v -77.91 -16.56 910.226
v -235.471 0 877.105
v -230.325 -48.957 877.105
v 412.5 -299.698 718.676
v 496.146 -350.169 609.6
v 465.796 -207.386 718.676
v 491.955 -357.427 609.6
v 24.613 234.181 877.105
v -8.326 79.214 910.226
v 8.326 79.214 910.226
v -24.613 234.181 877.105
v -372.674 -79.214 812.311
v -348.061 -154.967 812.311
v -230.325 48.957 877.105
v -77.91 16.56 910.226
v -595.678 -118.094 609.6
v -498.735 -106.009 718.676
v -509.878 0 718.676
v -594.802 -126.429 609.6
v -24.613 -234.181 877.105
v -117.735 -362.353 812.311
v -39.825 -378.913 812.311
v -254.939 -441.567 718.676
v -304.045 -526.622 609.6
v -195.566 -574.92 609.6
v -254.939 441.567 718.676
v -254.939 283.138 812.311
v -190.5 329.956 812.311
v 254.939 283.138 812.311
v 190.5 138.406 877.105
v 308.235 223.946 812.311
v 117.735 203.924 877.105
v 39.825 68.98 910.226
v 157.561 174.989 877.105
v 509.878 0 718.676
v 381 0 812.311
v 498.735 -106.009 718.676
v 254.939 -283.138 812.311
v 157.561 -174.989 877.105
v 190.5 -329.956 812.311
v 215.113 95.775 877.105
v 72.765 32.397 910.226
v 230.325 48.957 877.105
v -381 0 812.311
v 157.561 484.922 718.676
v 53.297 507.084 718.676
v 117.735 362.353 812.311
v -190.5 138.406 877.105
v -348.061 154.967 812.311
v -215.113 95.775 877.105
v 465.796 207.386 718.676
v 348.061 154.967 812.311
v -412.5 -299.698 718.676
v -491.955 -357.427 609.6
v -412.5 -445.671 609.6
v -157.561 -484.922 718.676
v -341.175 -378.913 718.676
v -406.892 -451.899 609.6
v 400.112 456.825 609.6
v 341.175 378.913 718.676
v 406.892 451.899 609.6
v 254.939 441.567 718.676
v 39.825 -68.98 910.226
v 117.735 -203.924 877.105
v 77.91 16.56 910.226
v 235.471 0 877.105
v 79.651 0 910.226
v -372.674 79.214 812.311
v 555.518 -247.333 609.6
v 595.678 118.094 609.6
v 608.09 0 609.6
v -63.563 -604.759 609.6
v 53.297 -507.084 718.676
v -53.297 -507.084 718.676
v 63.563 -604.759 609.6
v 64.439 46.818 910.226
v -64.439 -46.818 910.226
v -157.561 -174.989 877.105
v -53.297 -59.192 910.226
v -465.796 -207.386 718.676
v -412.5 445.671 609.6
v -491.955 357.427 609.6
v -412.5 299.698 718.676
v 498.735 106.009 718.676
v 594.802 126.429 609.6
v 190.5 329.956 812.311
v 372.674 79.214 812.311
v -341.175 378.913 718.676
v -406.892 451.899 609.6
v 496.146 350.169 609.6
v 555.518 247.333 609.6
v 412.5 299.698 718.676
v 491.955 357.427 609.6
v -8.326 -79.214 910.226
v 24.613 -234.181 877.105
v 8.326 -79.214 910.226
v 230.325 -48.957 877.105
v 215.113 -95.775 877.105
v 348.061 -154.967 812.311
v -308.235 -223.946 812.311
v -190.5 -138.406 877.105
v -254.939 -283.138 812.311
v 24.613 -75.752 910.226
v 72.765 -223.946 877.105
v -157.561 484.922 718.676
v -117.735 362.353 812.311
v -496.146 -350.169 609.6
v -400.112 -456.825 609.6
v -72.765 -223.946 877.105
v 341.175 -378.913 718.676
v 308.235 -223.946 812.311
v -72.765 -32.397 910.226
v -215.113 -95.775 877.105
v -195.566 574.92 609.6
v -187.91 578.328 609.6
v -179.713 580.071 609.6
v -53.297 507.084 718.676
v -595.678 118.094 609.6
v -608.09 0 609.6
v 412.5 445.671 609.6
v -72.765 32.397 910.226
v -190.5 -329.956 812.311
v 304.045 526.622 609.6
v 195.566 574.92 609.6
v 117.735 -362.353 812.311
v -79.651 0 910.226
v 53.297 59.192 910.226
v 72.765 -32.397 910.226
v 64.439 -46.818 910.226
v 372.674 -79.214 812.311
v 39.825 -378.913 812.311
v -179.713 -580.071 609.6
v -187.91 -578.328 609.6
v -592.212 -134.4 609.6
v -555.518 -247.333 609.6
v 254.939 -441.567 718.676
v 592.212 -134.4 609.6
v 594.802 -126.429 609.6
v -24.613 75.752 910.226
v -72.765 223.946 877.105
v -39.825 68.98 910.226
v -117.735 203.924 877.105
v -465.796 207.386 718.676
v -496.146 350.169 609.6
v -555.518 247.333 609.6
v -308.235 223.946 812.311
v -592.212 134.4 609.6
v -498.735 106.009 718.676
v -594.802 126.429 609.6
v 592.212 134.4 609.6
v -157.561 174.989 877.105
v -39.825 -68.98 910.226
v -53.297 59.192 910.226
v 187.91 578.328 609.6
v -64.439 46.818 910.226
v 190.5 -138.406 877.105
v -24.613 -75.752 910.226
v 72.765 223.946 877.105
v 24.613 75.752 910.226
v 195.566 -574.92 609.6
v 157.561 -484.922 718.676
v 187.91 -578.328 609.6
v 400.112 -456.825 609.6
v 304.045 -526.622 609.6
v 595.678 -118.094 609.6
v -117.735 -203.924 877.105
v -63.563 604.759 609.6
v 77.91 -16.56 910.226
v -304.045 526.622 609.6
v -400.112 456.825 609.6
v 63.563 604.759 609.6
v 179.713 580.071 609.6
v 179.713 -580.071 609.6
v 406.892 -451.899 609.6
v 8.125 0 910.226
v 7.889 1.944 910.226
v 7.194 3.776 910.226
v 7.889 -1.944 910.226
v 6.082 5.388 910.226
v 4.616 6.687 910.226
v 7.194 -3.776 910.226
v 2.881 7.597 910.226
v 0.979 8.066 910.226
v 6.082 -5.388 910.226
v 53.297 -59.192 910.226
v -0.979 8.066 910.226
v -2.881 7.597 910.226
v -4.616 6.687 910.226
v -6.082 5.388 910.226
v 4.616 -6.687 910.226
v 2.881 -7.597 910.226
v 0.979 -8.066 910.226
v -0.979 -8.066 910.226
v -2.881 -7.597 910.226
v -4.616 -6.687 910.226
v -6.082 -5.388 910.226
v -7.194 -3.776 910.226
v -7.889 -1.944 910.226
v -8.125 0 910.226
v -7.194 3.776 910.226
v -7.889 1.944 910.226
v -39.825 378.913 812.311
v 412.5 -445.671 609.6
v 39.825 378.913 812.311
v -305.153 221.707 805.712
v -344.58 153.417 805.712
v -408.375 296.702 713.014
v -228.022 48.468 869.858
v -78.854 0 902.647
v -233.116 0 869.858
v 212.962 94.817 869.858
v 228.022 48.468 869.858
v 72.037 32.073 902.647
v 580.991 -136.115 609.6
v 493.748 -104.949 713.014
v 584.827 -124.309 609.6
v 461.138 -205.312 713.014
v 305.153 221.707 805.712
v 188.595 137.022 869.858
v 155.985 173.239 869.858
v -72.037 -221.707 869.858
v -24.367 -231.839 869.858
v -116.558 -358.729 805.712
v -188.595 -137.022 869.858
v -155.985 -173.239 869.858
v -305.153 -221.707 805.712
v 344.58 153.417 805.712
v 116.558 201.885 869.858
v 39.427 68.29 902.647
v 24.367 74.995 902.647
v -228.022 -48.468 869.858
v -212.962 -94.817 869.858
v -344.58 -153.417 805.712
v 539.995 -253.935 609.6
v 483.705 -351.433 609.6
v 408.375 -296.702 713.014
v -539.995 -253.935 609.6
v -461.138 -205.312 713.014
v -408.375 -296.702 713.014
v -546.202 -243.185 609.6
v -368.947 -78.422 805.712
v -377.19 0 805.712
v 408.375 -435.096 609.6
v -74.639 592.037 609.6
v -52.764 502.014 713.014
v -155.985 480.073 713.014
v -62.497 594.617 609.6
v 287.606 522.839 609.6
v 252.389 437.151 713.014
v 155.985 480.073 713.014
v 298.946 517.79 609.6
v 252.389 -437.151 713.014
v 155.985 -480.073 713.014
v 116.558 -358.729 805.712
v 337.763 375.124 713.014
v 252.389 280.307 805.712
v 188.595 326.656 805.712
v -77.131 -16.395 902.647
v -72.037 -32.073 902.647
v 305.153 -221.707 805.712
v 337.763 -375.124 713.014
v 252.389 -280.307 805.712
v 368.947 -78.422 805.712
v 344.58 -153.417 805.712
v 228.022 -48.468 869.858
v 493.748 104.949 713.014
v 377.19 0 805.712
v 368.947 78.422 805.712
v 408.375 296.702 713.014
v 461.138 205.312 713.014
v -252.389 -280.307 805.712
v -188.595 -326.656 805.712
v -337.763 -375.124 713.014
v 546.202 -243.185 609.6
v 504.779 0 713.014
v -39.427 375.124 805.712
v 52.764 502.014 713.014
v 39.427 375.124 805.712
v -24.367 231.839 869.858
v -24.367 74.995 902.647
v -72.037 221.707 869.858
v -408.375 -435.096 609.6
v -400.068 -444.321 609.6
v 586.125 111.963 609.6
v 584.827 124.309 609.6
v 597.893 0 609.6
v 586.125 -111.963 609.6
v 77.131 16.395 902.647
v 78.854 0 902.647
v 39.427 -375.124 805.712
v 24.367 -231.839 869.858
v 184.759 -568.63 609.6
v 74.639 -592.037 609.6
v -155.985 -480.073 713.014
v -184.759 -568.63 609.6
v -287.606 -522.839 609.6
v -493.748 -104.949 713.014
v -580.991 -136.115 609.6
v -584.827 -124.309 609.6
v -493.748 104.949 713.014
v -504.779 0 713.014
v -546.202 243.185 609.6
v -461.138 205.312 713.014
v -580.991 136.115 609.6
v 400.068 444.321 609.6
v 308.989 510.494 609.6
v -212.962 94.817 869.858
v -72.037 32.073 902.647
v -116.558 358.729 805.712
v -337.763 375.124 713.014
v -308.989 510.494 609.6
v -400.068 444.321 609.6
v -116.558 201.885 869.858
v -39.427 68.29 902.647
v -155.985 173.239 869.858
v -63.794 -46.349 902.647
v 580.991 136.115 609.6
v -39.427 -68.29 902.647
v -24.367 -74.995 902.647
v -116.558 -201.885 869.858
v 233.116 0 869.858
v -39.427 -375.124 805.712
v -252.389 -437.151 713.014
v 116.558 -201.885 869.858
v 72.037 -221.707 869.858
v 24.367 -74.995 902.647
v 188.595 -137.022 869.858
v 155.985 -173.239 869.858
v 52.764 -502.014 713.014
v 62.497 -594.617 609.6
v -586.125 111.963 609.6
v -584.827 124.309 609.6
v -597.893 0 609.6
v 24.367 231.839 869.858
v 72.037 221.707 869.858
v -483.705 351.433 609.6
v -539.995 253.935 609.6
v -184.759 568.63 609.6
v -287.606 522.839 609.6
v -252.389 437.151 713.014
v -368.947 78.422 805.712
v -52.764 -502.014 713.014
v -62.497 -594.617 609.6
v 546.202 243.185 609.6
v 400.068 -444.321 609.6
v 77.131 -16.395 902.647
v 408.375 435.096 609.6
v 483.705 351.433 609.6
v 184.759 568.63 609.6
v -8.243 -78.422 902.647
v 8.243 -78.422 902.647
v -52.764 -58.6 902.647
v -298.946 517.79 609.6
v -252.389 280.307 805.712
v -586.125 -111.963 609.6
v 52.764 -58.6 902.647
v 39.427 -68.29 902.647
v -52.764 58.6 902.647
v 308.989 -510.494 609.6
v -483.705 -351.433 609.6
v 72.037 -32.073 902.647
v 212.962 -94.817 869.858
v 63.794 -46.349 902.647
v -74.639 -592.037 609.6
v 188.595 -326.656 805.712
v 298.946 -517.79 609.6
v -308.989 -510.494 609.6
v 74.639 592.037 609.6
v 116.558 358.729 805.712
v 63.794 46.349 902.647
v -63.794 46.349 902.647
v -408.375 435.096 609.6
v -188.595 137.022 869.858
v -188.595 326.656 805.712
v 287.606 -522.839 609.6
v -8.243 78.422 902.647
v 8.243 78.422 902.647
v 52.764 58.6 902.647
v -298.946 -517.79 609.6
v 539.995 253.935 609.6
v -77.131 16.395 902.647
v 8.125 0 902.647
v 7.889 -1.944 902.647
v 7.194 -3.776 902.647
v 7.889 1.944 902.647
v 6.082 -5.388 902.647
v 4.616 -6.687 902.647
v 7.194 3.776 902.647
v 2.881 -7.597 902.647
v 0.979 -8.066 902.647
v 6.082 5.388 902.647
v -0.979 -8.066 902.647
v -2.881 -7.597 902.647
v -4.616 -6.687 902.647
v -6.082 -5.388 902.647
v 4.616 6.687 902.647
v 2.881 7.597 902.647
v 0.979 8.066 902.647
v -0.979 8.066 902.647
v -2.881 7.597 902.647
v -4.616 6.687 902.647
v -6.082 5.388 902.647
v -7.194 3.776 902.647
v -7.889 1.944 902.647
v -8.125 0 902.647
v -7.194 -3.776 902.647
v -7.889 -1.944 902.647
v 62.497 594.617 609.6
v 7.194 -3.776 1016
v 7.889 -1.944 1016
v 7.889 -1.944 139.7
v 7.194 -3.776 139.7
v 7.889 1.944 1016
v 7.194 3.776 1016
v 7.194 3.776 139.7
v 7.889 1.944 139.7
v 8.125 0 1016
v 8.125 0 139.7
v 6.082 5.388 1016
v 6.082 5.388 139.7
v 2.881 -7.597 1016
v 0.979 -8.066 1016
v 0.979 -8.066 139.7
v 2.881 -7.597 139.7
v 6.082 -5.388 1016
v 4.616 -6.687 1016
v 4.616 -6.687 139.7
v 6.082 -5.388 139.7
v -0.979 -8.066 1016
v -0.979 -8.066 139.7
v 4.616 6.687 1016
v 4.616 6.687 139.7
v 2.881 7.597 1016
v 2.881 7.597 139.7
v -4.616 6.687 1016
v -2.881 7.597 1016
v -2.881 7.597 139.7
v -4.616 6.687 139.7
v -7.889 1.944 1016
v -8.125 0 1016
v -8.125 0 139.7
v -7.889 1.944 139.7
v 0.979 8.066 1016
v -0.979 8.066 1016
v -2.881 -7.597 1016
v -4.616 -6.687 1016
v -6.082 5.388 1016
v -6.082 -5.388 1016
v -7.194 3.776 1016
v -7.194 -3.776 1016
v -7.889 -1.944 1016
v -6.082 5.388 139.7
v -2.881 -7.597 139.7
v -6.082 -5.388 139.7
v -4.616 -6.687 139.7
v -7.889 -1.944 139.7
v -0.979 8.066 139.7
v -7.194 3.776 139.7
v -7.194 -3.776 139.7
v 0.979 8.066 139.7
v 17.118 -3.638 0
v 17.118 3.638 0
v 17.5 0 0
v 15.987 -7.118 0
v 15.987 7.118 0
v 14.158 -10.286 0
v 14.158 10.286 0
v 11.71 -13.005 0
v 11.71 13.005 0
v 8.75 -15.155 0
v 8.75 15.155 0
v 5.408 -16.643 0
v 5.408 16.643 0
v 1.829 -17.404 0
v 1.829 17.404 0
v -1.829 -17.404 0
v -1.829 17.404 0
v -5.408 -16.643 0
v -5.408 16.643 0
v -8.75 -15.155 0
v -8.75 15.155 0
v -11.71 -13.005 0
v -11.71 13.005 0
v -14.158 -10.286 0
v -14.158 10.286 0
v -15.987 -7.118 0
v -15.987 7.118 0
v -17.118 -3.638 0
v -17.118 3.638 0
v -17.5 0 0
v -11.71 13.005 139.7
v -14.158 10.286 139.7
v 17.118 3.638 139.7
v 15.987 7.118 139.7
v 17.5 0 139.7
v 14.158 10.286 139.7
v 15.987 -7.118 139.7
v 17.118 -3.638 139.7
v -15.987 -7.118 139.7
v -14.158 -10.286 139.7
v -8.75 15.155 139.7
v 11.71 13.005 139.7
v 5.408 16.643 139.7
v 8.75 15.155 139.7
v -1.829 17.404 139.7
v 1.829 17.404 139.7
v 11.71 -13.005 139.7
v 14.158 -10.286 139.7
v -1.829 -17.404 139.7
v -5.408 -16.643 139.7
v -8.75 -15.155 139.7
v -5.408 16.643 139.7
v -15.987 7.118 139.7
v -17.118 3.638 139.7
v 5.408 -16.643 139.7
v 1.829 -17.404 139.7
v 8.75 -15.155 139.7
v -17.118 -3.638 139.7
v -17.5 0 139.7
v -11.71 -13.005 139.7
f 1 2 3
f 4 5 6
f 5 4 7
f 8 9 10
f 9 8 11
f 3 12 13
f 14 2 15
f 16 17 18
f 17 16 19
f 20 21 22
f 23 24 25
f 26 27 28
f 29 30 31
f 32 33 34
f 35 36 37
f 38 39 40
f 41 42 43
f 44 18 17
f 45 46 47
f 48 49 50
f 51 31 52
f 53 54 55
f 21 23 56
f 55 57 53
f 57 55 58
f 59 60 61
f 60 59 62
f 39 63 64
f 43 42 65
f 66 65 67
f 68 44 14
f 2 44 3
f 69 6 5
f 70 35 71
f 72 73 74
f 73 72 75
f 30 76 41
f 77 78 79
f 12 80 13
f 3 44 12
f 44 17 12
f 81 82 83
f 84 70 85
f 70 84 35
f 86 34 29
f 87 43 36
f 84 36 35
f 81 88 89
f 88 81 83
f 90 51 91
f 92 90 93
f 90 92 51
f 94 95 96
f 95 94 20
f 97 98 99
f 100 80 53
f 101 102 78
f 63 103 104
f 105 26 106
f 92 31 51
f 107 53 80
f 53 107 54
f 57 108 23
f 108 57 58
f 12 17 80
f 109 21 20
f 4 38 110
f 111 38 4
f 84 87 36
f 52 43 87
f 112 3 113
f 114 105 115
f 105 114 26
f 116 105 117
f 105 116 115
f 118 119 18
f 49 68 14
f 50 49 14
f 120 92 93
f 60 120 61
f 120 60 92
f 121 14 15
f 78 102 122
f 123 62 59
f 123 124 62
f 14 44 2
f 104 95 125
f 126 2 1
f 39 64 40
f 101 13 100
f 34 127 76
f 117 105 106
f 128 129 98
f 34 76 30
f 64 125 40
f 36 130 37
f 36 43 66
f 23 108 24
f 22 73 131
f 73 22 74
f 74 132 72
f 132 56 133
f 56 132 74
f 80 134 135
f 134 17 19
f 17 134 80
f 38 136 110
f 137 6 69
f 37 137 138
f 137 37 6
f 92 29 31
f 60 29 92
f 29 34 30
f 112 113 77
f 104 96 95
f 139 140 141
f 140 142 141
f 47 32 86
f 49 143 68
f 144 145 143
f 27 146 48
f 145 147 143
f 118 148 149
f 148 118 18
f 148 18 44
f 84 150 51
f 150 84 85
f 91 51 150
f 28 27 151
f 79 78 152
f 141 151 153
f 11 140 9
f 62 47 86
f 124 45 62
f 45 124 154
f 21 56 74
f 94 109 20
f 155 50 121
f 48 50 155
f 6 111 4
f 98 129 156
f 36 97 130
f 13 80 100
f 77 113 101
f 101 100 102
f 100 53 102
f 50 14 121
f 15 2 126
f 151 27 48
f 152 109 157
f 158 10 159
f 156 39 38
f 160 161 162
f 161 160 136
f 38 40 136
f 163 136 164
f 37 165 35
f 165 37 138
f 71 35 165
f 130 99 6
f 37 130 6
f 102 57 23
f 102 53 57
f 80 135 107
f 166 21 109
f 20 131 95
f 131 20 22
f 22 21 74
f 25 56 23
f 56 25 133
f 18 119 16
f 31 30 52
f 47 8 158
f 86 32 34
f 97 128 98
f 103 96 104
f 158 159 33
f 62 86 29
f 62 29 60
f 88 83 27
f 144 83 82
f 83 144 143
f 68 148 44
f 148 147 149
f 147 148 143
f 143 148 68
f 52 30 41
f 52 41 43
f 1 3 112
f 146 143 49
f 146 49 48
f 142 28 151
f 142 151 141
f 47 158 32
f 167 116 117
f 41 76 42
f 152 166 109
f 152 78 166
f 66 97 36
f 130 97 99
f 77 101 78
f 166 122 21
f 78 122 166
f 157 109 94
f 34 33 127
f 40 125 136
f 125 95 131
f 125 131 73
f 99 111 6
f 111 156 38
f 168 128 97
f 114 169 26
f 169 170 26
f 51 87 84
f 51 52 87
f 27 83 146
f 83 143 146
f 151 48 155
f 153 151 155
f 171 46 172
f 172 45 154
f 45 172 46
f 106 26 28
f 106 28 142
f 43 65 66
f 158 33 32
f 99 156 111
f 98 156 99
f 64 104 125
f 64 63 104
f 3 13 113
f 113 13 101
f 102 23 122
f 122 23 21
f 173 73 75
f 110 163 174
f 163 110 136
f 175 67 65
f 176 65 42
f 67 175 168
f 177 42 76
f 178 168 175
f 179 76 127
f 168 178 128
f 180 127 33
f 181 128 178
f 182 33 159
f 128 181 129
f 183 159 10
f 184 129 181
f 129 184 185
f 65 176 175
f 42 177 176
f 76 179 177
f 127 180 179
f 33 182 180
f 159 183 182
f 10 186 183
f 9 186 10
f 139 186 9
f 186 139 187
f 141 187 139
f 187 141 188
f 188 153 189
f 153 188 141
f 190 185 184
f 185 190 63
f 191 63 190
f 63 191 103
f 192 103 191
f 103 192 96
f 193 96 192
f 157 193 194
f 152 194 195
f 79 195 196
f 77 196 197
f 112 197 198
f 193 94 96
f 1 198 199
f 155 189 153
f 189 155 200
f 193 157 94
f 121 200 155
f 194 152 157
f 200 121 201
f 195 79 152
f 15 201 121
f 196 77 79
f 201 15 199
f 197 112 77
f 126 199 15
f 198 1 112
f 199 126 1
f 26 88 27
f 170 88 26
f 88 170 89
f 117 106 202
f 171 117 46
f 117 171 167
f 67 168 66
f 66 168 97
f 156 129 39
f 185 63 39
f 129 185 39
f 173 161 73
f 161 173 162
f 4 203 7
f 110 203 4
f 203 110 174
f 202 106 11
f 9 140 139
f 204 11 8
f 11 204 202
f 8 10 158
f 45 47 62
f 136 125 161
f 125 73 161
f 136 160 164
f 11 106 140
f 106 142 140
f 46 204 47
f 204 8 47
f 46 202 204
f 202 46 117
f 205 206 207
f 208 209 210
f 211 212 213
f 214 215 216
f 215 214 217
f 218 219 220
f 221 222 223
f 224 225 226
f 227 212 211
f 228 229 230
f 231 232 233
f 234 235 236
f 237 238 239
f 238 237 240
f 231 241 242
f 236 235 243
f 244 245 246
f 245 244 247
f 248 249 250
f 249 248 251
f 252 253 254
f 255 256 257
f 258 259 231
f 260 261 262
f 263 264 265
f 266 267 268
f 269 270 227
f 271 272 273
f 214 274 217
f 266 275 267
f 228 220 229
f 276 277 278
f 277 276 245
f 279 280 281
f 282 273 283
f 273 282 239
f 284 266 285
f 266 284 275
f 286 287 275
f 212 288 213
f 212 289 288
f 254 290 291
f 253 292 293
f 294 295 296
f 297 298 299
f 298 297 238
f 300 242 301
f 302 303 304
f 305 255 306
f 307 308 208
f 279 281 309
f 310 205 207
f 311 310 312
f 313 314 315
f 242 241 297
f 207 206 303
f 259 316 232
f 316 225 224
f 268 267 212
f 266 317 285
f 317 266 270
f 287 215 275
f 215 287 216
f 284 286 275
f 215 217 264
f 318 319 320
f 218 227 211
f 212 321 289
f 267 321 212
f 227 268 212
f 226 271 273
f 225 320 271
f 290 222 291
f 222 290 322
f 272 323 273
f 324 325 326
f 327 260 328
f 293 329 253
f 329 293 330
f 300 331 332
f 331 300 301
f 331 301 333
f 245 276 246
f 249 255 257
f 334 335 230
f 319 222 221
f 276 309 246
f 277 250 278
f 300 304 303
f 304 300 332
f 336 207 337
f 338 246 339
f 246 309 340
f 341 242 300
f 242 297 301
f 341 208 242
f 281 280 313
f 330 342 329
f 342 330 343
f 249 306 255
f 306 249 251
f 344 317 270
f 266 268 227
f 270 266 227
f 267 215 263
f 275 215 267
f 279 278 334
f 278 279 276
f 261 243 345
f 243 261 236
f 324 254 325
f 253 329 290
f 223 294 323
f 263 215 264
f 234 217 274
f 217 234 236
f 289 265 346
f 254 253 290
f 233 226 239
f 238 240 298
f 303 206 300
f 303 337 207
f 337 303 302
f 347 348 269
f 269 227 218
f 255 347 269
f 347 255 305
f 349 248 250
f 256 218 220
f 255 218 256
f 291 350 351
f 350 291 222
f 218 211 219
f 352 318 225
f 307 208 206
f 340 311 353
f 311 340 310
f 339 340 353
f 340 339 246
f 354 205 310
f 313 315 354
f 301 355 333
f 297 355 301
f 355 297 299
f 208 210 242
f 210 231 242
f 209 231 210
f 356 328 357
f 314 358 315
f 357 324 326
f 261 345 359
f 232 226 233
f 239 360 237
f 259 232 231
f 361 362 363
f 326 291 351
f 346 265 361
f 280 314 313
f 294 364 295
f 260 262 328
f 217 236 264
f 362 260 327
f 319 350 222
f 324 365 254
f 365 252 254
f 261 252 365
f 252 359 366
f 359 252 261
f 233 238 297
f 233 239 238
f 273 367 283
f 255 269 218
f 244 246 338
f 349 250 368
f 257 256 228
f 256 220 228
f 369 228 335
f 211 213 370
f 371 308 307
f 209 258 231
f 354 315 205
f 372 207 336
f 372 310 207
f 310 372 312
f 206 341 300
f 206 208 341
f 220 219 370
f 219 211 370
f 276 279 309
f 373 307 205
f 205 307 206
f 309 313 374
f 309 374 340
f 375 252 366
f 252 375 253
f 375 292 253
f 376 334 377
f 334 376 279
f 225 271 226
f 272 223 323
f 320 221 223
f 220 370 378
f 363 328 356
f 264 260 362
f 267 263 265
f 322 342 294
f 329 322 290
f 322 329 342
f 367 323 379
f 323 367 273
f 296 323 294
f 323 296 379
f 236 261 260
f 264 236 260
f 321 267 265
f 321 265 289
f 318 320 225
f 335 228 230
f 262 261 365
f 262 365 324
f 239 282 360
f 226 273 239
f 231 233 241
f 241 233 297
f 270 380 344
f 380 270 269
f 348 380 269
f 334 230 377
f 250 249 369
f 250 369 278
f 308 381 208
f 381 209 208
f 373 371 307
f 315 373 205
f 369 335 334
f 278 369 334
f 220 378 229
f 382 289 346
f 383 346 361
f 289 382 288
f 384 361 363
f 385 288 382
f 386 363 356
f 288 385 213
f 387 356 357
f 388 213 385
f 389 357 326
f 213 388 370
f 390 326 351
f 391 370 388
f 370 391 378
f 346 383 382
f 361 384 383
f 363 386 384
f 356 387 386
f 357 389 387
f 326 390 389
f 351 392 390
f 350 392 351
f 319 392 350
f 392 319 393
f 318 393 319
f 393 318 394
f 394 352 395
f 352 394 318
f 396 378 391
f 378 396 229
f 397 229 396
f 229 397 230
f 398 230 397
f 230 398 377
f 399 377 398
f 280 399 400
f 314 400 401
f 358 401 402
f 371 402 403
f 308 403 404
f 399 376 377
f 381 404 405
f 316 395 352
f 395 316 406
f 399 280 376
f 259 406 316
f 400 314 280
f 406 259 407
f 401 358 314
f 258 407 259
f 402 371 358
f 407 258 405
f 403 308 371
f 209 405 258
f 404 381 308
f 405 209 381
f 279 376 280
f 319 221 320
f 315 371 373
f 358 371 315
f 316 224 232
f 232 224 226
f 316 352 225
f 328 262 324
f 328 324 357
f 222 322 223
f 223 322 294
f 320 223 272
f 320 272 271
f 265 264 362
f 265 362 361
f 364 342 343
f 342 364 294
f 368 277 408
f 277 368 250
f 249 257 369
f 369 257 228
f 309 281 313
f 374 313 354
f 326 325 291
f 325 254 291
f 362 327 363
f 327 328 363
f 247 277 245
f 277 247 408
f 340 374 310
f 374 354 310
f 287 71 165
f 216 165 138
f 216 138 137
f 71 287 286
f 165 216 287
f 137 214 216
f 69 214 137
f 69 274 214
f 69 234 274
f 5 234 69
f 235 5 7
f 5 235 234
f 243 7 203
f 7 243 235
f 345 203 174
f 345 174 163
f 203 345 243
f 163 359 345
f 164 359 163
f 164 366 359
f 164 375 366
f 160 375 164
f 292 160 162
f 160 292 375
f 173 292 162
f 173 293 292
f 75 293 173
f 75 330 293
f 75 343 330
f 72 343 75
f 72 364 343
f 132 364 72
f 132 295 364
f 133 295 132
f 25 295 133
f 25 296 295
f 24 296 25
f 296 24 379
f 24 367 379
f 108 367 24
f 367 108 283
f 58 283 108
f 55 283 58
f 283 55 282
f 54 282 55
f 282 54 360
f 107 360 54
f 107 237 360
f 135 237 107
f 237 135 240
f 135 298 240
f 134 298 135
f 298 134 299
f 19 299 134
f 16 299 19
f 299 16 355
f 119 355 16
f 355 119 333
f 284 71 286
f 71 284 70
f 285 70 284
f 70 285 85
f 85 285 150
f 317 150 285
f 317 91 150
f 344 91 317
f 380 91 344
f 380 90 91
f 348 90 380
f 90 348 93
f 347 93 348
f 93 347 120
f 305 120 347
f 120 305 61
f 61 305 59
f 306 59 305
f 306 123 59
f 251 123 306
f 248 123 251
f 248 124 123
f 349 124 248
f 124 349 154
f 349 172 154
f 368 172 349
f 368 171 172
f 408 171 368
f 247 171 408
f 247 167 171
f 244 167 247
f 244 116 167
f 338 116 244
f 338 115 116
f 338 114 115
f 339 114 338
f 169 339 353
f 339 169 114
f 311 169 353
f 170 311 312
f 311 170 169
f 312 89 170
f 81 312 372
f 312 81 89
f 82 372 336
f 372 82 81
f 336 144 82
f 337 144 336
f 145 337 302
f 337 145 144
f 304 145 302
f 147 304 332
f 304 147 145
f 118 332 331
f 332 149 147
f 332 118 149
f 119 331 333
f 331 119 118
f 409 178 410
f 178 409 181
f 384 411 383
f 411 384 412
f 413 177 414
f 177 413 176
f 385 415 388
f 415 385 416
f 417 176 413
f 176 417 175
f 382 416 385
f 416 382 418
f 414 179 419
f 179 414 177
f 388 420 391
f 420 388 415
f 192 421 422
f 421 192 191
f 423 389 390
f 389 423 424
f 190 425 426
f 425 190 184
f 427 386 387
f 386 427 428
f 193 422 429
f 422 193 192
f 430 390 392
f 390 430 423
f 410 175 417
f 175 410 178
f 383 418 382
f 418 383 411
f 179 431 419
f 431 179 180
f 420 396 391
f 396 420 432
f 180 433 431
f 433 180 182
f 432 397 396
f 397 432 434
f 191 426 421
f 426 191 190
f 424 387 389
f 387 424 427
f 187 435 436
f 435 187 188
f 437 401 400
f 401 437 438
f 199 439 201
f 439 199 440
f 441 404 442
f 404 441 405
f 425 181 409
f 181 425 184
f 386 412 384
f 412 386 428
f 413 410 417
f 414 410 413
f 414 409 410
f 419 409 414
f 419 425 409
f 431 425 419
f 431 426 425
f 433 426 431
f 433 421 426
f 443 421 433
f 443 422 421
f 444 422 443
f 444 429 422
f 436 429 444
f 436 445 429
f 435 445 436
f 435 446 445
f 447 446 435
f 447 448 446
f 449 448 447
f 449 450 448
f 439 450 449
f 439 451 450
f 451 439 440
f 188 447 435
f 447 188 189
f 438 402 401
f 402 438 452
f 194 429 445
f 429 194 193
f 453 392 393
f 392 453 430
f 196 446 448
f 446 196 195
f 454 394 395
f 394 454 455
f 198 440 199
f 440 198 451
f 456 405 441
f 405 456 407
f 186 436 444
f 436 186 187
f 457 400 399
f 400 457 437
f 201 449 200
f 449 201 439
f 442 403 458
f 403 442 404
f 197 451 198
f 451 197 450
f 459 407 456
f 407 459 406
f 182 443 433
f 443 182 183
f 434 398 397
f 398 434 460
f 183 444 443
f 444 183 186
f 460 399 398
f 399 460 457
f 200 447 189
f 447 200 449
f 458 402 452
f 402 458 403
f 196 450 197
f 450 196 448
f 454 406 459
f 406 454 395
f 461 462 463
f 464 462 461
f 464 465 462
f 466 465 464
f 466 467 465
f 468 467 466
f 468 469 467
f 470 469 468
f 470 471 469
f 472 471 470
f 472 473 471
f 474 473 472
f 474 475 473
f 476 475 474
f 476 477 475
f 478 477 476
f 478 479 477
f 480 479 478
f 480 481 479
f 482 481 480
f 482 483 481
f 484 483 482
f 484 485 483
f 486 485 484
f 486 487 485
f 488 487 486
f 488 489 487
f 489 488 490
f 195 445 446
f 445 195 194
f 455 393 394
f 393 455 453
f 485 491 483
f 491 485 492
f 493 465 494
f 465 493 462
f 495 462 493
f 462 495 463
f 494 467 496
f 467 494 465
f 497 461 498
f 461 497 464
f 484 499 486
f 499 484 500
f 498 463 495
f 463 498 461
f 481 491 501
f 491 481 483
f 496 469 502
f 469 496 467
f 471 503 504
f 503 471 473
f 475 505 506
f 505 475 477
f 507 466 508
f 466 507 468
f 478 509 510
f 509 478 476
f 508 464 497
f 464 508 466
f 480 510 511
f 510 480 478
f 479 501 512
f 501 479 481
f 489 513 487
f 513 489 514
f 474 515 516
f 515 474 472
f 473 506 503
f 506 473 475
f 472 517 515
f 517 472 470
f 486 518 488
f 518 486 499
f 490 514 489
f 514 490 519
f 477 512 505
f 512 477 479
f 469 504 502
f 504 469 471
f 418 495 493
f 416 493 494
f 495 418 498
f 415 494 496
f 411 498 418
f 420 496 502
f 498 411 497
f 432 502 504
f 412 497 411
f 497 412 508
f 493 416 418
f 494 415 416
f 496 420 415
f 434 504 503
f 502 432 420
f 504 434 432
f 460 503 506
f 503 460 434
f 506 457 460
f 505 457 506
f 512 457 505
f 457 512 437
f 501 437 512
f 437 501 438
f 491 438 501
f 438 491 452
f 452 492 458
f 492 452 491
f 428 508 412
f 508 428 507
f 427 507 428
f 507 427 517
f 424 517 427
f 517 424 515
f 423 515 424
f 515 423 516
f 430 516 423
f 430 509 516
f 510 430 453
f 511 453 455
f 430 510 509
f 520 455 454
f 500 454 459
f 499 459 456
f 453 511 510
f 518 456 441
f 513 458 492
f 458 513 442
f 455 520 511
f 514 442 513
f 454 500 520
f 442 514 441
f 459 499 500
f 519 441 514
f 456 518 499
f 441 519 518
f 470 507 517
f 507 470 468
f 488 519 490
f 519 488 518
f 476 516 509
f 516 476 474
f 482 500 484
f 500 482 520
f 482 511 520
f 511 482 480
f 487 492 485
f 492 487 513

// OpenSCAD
// -*- mode: SCAD; tab-width: 4; -*-


overlap = .2;

function in2mm( in ) = in * 25.4;

chair_mount_diam = 16.25;
chair_mount_height = in2mm( 6 );

chair_back_height = in2mm( 36 );
chair_seat_height = in2mm( 17 );

chair_width = in2mm( 17.5 );

umbrella_handle_diam = 35;
umbrella_handle_height = in2mm( 5.5 );

umbrella_shaft_diam = 16.25; // TEMP
umbrella_shaft_height = in2mm( 40 );
umbrella_tip_height = in2mm( 4 );

umbrella_canopy_height = in2mm( 12 );
// spherical cap: r = (a**2 + h**2)/2h
umbrella_canopy_diam = in2mm( (pow(24,2) + pow(12,2))/12 );

umbrella();
//chair_frame();

module umbrella_handle() {
    cylinder(r=umbrella_handle_diam/2,h=umbrella_handle_height);
}

module umbrella_shaft() {
    cylinder(r=umbrella_shaft_diam/2,h=umbrella_shaft_height);
}

module umbrella_canopy() {
	translate([0,0,-umbrella_canopy_diam/2+umbrella_canopy_height])
    difference() {
	sphere(r=umbrella_canopy_diam/2);
	sphere(r=umbrella_canopy_diam/2*.99);
	translate([0,0,-umbrella_canopy_height/2])
	cube([umbrella_canopy_diam+overlap,
		  umbrella_canopy_diam+overlap,
		  umbrella_canopy_diam-umbrella_canopy_height],center=true);
    }
}

module umbrella() {
	translate([0,0,umbrella_shaft_height-umbrella_canopy_height-umbrella_tip_height])
    umbrella_canopy();
    umbrella_shaft();
    umbrella_handle();
}

module chair_mount() {
    cylinder(r=chair_mount_diam/2,h=chair_mount_height);
}

module chair_frame() {
    for ( x = [-chair_width/2,chair_width/2])
    translate([x,0,0])
    chair_mount();
}
